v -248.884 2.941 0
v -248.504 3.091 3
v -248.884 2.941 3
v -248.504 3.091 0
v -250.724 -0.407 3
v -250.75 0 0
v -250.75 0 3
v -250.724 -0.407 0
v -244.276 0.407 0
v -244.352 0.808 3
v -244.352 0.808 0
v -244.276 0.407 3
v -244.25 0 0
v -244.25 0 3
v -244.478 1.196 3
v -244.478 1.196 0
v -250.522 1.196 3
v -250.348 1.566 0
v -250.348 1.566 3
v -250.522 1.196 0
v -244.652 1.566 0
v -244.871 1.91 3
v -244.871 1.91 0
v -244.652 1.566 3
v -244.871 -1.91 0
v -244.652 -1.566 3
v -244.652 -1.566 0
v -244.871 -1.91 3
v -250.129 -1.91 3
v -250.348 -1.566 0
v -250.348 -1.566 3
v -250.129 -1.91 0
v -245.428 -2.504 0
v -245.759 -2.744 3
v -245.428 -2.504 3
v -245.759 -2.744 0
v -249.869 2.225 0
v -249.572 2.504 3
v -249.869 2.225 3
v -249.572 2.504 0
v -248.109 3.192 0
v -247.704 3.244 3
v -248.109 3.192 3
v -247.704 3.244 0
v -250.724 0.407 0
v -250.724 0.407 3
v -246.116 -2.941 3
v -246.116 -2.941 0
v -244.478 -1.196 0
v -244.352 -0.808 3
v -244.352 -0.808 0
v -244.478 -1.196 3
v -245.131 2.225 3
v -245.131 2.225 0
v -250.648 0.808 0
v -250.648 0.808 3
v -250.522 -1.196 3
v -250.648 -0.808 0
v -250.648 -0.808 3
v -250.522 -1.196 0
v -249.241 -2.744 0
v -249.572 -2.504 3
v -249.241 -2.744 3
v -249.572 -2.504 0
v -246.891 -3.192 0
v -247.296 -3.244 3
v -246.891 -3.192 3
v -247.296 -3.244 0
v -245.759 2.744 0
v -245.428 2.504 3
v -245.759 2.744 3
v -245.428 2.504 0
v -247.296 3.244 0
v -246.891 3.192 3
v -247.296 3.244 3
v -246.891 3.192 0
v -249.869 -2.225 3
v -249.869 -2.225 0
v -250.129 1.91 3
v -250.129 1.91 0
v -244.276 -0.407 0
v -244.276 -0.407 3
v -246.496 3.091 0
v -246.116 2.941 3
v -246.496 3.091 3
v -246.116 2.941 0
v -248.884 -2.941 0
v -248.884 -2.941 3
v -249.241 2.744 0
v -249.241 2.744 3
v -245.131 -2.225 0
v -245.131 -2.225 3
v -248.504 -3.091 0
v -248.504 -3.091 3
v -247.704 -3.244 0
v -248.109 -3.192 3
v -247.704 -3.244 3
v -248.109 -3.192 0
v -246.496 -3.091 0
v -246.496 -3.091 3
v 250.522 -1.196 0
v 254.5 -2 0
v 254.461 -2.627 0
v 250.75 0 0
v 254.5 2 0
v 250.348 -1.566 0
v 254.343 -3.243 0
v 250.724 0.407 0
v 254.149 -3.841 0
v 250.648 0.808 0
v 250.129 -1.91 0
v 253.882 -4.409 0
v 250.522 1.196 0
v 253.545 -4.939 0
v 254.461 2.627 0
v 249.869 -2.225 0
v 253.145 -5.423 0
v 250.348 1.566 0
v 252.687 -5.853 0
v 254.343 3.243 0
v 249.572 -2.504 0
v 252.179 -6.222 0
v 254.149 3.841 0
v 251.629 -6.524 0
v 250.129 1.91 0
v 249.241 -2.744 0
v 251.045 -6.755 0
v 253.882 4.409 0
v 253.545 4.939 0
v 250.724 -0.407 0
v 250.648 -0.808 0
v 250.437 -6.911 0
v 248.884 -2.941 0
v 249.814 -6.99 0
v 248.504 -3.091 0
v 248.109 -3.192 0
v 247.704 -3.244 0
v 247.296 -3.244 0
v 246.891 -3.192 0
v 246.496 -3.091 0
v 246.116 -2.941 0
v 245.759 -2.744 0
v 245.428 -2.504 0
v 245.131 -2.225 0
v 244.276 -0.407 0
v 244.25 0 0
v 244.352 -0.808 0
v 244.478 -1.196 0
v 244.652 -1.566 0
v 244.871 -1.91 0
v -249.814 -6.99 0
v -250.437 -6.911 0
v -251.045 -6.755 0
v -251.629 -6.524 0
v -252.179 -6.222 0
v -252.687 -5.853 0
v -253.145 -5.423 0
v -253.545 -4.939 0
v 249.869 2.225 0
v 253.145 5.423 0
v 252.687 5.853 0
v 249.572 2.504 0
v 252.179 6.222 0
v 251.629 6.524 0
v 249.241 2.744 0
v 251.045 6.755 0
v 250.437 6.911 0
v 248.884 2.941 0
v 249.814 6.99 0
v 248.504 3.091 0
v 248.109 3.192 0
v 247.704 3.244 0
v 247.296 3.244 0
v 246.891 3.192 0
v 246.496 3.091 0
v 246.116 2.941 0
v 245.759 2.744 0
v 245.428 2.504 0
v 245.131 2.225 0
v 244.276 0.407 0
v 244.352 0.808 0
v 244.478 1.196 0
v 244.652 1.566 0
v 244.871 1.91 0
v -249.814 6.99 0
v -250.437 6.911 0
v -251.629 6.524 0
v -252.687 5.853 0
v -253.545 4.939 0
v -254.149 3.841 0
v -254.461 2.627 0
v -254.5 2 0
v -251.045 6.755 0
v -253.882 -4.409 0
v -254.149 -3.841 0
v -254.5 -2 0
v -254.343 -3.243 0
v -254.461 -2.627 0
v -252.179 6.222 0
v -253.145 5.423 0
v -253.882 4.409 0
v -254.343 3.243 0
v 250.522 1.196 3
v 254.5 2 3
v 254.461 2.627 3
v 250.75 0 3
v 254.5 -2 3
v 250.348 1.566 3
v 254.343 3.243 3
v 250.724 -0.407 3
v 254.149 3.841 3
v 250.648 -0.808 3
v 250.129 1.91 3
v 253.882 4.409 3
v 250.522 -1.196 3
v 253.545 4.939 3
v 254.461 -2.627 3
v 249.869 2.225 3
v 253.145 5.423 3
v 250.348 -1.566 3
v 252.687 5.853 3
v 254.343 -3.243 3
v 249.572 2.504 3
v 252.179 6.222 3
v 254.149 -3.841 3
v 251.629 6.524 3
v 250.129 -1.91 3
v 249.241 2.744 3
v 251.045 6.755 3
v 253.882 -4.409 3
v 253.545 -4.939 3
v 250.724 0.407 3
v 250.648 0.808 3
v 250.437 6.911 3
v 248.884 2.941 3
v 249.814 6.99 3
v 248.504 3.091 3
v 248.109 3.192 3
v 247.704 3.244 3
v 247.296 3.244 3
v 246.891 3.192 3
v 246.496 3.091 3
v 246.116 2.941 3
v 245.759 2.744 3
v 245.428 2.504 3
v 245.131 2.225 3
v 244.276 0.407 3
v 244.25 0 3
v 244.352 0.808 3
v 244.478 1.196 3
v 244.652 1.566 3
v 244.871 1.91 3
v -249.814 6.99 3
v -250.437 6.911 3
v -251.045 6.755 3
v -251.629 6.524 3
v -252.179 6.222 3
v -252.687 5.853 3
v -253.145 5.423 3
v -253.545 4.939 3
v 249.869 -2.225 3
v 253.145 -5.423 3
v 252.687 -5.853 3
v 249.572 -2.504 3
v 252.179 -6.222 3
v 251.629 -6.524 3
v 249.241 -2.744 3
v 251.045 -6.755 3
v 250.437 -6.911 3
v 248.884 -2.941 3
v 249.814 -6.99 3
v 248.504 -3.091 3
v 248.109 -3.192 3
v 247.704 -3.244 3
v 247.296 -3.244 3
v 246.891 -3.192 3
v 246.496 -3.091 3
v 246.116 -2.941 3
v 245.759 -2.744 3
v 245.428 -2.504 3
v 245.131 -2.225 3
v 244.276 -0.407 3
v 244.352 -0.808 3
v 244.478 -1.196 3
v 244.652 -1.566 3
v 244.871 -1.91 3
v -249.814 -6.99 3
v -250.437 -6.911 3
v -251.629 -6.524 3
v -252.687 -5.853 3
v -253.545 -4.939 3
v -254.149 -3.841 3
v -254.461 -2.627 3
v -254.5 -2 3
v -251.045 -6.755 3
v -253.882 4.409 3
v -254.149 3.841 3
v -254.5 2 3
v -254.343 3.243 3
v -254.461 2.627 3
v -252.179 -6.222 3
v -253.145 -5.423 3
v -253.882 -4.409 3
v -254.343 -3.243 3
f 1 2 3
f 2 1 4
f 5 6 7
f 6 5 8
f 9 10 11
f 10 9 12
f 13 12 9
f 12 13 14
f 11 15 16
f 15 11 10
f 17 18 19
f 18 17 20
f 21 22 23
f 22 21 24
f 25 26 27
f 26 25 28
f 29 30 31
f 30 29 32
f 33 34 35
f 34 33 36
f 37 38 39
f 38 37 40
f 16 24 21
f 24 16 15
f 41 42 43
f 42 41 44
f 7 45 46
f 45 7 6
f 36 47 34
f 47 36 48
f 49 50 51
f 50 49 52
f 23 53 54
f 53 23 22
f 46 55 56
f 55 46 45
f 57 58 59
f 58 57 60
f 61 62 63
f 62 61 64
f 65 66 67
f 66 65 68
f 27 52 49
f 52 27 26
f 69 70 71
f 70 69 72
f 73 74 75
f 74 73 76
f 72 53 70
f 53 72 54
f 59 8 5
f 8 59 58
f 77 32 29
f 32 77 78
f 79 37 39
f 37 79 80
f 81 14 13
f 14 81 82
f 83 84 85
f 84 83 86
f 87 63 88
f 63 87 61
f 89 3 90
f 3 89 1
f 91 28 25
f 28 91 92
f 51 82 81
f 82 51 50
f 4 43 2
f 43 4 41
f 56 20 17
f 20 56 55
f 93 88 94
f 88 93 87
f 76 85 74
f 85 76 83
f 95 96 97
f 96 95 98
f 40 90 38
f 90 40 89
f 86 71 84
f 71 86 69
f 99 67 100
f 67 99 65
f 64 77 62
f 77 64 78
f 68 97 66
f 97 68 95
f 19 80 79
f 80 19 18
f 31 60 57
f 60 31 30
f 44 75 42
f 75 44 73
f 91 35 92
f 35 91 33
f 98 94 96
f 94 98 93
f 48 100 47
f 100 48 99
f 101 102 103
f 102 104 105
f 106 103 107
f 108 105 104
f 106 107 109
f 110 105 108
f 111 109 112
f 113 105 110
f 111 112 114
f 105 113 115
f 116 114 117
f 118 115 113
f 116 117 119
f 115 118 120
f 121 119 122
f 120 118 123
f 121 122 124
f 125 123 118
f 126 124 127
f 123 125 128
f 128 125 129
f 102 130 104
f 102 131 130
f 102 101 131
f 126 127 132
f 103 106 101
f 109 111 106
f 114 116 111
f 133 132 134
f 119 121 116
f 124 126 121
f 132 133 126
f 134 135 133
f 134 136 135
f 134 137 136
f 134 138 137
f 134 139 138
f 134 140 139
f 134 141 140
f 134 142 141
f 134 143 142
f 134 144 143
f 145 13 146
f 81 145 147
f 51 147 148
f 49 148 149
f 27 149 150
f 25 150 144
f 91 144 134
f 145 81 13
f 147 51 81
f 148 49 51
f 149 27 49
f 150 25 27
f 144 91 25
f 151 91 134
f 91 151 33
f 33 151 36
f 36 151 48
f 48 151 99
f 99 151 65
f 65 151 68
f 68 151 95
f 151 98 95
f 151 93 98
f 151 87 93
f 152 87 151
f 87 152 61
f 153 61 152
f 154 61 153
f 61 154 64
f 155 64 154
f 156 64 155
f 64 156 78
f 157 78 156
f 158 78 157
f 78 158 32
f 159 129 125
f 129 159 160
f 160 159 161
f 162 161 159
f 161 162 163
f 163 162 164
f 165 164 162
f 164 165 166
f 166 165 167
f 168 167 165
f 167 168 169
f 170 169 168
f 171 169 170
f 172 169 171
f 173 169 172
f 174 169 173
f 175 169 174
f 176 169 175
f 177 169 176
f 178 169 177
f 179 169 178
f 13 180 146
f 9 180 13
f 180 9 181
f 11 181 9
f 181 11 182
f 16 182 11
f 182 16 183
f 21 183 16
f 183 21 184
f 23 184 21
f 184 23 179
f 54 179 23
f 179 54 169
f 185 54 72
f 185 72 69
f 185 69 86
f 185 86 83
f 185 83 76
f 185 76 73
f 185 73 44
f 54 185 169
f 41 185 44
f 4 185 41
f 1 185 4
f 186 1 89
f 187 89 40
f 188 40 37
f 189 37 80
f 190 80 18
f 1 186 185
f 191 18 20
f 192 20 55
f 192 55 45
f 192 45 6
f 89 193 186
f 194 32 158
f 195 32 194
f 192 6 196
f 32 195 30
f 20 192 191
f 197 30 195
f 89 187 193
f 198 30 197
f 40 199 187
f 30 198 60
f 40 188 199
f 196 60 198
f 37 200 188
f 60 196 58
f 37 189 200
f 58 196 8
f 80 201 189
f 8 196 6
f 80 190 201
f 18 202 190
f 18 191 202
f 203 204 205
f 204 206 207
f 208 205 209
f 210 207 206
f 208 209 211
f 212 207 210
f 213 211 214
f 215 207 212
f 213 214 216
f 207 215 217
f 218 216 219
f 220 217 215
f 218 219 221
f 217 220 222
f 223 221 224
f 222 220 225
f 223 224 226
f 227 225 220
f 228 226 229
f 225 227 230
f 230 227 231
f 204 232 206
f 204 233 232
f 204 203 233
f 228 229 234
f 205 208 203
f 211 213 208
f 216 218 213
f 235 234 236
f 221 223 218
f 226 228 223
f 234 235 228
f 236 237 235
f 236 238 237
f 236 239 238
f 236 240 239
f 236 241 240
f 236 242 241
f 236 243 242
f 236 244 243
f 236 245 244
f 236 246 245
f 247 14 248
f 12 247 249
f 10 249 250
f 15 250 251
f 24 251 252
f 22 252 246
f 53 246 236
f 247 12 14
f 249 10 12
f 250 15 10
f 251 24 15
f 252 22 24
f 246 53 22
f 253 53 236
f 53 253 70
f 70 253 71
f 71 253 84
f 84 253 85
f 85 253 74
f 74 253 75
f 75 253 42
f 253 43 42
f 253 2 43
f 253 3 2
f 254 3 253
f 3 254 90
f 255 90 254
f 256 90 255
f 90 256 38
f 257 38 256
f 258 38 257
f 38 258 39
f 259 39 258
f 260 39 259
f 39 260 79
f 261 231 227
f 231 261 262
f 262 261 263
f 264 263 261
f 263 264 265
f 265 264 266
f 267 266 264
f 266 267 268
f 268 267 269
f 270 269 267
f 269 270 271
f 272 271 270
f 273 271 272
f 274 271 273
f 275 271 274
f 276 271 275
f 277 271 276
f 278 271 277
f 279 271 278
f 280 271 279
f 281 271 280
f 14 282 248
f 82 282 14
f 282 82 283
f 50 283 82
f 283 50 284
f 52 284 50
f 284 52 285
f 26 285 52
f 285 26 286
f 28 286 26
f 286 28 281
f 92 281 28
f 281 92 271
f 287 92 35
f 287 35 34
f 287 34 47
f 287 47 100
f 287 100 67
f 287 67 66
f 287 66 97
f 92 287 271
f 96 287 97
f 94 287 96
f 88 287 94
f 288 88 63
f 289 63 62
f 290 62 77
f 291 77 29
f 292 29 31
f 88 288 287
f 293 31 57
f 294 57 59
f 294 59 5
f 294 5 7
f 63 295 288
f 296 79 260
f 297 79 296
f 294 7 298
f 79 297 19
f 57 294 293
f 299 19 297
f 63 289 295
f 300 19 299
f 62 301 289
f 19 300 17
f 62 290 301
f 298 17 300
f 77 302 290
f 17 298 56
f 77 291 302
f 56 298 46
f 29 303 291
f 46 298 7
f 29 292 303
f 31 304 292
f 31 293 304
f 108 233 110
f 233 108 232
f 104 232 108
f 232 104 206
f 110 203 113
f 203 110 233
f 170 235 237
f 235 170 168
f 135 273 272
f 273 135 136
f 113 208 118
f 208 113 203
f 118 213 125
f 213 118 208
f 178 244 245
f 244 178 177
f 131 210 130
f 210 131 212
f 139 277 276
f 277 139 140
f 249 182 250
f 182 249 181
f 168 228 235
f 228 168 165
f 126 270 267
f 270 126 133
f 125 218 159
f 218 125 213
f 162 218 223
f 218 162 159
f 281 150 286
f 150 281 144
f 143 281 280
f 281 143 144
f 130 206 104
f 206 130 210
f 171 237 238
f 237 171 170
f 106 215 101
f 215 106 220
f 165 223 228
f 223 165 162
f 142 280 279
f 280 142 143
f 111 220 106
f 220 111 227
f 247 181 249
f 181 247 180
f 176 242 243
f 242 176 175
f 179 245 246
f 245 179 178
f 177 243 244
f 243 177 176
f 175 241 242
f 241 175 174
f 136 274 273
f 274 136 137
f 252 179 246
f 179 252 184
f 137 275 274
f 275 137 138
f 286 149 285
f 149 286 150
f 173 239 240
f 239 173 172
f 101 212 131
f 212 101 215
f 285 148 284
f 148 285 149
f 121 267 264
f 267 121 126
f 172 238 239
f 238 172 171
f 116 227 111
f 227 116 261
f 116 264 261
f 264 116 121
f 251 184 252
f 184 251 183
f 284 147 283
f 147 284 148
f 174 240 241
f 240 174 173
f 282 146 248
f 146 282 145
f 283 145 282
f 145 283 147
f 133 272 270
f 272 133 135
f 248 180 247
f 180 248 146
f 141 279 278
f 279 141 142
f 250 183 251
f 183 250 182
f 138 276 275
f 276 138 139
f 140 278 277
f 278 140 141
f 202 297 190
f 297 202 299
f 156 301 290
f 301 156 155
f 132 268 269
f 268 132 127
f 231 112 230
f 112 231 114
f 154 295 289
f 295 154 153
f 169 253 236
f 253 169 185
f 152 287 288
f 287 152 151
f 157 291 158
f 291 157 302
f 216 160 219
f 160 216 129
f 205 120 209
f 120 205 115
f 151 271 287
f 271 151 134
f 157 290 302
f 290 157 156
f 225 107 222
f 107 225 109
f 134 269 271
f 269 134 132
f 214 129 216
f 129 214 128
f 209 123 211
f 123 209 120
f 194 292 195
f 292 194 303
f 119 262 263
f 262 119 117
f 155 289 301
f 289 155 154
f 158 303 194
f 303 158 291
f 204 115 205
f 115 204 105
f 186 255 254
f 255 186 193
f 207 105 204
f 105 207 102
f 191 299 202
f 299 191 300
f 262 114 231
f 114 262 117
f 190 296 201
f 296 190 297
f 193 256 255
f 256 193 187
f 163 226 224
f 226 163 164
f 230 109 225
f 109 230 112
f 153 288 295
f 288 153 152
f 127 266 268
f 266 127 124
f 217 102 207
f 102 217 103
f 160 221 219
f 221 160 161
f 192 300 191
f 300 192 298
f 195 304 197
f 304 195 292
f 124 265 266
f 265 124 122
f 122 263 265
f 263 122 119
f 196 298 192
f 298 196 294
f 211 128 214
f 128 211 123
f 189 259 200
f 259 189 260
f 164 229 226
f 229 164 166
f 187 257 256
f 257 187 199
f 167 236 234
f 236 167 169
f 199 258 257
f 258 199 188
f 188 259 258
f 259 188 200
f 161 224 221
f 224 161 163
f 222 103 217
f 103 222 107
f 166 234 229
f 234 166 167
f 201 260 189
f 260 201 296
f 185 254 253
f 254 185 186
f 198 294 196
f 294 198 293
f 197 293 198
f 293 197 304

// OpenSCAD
$fn = 50;


difference() {
	union() {
		hull() {
			translate(v = [-249.5000000000, 2.0000000000, 0]) {
				cylinder(h = 3, r = 5);
			}
			translate(v = [249.5000000000, 2.0000000000, 0]) {
				cylinder(h = 3, r = 5);
			}
			translate(v = [-249.5000000000, -2.0000000000, 0]) {
				cylinder(h = 3, r = 5);
			}
			translate(v = [249.5000000000, -2.0000000000, 0]) {
				cylinder(h = 3, r = 5);
			}
		}
	}
	union() {
		translate(v = [-247.5000000000, 0.0000000000, 0]) {
			cylinder(h = 3, r = 3.2500000000);
		}
		translate(v = [247.5000000000, 0.0000000000, 0]) {
			cylinder(h = 3, r = 3.2500000000);
		}
		translate(v = [-247.5000000000, 0.0000000000, 0]) {
			cylinder(h = 3, r = 1.8000000000);
		}
		translate(v = [247.5000000000, 0.0000000000, 0]) {
			cylinder(h = 3, r = 1.8000000000);
		}
		translate(v = [-247.5000000000, 0.0000000000, 0]) {
			cylinder(h = 3, r = 1.8000000000);
		}
		translate(v = [247.5000000000, 0.0000000000, 0]) {
			cylinder(h = 3, r = 1.8000000000);
		}
		translate(v = [-247.5000000000, 0.0000000000, 0]) {
			cylinder(h = 3, r = 1.8000000000);
		}
		translate(v = [247.5000000000, 0.0000000000, 0]) {
			cylinder(h = 3, r = 1.8000000000);
		}
	}
}
